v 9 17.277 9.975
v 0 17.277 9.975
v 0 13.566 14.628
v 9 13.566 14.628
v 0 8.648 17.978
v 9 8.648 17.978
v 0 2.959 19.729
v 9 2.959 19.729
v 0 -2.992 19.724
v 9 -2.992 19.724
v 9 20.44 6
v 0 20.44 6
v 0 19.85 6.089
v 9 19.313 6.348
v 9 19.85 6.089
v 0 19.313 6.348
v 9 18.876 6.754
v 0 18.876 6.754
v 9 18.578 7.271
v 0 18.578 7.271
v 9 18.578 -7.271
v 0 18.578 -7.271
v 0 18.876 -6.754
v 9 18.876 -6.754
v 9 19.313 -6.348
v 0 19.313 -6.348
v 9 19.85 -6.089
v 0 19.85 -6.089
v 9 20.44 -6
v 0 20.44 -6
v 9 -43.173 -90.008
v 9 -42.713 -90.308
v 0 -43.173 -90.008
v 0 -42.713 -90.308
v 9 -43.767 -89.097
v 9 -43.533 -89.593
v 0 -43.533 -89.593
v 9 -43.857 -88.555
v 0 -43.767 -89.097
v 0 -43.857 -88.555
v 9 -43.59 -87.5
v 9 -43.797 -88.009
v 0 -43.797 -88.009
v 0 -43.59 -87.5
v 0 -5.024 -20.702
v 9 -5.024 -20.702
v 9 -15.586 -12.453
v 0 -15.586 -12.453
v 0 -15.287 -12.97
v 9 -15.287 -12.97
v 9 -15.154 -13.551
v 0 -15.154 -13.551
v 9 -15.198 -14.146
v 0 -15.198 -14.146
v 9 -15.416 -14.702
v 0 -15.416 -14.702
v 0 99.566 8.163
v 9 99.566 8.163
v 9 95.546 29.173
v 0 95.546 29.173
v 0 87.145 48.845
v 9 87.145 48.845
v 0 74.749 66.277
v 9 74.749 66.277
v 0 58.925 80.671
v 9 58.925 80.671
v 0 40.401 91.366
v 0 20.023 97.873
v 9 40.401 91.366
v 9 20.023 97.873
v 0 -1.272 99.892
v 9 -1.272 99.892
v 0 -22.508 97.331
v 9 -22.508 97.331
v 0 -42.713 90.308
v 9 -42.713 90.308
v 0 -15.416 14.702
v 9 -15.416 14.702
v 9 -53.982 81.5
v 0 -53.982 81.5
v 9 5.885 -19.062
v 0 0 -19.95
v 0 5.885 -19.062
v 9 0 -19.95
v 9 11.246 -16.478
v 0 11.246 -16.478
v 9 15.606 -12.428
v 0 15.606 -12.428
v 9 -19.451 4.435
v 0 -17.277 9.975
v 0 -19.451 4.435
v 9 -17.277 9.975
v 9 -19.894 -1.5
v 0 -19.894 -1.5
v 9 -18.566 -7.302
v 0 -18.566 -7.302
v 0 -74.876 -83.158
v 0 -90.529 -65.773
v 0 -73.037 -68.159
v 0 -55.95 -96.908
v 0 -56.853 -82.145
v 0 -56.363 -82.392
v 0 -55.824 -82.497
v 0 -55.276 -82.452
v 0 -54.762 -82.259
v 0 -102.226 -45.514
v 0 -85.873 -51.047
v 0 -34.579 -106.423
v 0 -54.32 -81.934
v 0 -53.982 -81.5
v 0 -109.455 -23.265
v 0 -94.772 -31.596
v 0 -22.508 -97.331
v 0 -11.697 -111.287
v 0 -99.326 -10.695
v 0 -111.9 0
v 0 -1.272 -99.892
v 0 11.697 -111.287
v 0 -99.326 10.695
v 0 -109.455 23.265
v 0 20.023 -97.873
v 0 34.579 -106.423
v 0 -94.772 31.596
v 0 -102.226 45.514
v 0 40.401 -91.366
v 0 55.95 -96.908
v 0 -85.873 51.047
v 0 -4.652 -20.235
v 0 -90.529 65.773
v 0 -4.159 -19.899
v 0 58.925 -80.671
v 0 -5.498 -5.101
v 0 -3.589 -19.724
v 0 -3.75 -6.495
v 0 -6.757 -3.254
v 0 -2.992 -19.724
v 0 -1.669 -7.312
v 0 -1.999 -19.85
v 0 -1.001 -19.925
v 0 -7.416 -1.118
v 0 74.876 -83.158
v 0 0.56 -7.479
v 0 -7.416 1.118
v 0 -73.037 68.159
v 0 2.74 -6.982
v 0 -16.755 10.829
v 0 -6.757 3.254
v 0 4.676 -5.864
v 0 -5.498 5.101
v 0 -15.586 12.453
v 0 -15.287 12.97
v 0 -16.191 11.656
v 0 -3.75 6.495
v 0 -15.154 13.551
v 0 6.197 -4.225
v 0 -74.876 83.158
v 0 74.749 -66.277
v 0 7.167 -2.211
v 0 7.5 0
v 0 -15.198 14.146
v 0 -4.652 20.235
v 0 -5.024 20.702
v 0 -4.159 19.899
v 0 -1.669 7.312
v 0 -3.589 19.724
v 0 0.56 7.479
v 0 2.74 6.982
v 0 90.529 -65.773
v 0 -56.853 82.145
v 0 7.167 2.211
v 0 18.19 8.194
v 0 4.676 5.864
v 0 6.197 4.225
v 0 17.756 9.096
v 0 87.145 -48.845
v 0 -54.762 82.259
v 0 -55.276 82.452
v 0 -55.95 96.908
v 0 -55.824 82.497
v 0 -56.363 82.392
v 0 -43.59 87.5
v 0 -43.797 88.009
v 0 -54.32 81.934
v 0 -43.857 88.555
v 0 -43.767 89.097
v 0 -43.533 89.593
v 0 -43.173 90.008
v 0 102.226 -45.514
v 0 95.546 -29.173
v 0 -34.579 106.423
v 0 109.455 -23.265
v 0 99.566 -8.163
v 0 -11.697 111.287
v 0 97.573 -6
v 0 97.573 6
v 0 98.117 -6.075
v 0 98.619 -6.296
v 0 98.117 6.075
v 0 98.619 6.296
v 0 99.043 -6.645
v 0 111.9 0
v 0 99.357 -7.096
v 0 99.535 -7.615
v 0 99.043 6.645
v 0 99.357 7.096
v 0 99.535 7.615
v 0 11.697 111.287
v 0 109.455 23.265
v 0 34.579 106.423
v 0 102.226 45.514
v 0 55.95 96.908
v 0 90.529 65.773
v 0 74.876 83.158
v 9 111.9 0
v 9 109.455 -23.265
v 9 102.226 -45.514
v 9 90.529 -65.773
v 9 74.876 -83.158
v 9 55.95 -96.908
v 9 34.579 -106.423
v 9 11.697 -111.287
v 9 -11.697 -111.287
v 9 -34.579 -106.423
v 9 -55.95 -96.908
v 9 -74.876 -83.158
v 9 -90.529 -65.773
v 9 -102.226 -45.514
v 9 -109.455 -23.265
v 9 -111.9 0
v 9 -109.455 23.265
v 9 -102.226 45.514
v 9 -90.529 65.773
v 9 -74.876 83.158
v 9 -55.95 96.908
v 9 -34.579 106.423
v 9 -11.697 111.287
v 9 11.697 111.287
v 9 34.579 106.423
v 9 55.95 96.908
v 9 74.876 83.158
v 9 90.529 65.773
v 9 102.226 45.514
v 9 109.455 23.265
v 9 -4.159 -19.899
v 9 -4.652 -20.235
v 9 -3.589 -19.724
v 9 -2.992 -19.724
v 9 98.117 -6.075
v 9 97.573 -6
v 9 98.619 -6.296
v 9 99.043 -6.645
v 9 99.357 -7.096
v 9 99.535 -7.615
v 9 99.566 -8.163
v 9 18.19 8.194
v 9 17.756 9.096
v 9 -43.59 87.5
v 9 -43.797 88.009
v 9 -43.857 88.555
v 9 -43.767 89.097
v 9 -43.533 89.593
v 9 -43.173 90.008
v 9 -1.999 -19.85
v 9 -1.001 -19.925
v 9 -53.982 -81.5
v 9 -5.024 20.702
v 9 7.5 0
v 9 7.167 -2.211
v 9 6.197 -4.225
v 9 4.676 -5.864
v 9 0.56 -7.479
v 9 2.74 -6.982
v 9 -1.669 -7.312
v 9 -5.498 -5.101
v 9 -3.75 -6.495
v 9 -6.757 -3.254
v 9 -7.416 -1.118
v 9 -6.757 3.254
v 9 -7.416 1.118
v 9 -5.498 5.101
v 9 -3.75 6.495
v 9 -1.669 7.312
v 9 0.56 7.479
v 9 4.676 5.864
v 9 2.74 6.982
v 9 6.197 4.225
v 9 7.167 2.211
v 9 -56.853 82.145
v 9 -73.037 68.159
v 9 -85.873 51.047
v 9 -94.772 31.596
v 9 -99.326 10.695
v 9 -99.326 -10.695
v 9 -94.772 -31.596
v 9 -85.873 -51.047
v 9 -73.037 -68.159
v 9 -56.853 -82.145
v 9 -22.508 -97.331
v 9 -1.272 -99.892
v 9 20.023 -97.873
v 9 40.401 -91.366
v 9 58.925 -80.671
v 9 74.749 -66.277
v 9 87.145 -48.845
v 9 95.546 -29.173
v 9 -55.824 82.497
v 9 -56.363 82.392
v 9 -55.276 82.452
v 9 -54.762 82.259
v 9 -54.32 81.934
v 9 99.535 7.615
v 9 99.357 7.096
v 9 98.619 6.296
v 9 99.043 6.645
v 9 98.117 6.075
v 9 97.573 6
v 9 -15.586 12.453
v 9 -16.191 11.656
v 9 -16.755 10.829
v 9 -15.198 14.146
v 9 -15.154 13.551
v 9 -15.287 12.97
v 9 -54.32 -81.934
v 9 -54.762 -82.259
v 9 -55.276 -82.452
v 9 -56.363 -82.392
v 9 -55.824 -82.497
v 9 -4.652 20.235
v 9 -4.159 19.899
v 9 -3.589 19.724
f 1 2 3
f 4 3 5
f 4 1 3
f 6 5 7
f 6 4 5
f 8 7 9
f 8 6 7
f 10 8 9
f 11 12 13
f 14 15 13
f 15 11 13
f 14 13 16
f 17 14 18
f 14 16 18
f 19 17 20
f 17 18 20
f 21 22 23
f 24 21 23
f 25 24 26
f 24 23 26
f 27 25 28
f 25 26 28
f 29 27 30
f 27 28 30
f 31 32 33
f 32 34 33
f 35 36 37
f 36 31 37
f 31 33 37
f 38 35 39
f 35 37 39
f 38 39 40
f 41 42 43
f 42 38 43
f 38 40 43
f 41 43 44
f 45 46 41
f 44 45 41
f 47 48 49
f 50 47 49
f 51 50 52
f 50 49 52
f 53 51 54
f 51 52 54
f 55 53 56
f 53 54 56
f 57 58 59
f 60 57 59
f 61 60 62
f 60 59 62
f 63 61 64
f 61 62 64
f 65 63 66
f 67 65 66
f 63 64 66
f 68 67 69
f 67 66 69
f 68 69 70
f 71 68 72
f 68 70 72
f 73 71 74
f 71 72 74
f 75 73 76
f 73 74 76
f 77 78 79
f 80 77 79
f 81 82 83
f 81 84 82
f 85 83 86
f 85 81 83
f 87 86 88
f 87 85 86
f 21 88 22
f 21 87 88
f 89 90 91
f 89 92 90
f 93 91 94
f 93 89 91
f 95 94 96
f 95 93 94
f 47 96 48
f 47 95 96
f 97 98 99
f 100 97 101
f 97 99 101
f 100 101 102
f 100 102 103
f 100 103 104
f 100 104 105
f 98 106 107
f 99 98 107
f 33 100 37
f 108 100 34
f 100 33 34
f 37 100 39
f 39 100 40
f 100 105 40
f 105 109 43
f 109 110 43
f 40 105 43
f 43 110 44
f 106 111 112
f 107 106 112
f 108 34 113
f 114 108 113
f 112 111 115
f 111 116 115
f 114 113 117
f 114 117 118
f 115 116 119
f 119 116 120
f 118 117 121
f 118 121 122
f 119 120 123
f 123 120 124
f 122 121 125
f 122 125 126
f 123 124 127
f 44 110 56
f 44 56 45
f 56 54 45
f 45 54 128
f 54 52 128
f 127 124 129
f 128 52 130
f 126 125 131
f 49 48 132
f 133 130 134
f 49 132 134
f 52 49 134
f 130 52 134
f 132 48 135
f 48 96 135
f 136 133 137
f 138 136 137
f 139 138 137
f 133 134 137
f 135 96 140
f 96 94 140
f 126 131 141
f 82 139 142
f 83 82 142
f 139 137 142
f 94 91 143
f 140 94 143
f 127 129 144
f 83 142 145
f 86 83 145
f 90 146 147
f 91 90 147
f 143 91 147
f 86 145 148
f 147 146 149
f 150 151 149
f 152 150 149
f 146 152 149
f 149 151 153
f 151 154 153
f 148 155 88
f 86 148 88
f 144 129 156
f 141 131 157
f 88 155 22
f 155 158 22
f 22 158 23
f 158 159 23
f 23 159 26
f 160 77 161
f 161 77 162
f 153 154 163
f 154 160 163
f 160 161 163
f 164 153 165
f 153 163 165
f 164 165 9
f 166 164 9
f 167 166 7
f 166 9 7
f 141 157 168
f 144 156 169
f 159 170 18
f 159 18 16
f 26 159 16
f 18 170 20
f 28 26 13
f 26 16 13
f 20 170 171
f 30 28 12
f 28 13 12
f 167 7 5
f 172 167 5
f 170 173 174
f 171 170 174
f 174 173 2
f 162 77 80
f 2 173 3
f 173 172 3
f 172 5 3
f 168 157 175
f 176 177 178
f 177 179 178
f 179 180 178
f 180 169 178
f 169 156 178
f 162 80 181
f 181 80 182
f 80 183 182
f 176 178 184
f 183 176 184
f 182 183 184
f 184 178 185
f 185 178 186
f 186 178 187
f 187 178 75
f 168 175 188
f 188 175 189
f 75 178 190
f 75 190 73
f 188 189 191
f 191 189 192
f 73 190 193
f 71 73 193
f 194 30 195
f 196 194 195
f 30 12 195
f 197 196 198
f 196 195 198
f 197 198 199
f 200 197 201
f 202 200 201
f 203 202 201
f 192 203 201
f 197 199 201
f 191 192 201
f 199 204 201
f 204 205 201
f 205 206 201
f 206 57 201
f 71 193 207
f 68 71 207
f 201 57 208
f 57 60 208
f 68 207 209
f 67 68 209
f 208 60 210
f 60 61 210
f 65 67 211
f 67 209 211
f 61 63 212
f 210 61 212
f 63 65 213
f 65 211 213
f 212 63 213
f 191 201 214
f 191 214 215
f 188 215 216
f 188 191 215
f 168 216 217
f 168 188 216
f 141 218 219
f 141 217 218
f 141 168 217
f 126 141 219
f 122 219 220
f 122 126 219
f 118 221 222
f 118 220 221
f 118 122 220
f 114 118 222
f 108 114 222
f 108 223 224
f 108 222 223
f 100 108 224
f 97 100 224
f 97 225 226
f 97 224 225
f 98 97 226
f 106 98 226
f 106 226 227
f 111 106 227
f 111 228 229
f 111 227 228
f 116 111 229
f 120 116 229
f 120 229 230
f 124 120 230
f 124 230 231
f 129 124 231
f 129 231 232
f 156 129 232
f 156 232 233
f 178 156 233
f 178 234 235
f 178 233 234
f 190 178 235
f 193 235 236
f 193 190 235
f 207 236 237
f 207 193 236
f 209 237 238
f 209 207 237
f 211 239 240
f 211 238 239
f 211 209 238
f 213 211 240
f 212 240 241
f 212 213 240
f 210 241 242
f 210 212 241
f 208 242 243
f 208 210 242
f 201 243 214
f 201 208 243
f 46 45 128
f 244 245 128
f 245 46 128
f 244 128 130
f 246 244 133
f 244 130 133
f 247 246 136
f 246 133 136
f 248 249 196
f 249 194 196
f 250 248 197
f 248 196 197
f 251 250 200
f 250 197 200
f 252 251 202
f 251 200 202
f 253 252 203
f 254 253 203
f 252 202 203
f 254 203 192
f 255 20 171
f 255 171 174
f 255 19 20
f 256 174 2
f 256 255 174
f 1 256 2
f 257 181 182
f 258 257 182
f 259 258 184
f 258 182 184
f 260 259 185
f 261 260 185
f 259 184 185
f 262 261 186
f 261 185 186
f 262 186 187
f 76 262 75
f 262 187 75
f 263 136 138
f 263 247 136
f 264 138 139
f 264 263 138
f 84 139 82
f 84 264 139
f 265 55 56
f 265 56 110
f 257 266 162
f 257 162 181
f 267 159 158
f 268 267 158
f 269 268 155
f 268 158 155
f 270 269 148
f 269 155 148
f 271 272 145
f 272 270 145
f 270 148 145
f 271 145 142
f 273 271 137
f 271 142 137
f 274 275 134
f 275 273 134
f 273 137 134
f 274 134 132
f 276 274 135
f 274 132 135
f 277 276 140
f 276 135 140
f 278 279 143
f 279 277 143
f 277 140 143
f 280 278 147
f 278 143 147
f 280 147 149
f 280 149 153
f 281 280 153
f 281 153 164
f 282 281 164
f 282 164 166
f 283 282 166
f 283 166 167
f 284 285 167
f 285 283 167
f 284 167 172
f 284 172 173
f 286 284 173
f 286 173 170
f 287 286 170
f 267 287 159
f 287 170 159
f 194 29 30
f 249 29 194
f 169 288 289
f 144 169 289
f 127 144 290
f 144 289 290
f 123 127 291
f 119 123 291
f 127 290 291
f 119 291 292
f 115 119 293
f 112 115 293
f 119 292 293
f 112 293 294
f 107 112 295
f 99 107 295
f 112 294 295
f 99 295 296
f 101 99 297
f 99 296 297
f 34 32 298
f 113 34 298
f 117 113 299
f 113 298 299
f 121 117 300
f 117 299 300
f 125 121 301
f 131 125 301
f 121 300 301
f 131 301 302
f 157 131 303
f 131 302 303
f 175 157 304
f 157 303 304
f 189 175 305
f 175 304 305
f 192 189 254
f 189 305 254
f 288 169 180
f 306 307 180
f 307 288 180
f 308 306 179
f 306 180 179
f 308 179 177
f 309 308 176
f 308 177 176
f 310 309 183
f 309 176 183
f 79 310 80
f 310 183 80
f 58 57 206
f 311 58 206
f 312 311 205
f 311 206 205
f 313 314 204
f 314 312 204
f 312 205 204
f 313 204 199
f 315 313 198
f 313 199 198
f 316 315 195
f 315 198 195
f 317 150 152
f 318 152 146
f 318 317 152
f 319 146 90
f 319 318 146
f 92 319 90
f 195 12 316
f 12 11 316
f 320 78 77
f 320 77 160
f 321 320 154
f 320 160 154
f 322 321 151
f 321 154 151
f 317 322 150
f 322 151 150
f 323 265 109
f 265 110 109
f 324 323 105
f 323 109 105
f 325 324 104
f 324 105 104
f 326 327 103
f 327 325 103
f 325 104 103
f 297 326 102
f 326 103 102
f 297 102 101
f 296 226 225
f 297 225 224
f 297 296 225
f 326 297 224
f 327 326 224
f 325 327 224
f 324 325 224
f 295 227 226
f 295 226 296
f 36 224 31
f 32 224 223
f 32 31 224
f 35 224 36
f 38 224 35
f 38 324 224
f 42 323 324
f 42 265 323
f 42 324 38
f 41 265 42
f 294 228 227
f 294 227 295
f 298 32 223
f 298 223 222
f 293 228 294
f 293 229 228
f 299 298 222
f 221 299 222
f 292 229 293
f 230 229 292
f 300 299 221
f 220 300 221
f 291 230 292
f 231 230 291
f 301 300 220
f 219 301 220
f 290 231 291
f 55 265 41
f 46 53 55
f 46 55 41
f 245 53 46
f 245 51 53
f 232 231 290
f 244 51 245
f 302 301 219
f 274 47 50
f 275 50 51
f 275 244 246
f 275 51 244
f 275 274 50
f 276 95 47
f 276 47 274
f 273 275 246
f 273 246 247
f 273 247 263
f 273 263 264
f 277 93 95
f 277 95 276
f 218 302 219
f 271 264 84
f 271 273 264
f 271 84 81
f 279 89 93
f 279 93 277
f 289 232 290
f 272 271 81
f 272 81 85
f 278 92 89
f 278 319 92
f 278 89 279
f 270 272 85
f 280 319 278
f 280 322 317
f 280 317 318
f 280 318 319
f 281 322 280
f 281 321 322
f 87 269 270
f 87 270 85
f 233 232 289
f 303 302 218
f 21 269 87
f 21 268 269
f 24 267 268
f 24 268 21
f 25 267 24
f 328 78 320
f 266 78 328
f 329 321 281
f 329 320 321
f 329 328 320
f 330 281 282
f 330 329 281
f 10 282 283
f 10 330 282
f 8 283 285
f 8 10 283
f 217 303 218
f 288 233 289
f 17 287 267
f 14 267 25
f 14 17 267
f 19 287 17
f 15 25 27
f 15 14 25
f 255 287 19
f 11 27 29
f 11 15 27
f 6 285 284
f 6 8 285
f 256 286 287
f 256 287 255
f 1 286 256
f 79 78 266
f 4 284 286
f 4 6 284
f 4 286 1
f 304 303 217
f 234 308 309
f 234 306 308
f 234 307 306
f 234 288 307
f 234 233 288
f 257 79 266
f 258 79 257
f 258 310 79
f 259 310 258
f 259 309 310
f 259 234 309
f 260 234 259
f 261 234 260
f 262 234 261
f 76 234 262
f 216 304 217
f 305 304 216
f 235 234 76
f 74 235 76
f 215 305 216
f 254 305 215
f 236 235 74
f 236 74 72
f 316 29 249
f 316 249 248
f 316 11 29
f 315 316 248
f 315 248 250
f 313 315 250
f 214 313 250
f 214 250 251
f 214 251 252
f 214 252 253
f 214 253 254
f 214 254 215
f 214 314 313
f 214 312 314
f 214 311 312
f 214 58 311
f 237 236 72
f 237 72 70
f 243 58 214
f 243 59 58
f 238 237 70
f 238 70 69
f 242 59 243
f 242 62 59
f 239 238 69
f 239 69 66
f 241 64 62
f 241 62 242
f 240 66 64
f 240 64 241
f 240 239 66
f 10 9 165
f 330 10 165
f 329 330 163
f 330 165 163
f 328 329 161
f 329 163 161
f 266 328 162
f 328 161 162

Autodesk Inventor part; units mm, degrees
ref_plane "YZ Plane" through (0, 0, 0) normal (1, 0, 0) x (0, 1, 0)
ref_plane "XZ Plane" through (0, 0, 0) normal (0, 1, 0) x (-1, 0, 0)
ref_plane "XY Plane" through (0, 0, 0) normal (0, 0, 1) x (1, 0, 0)
sketch "Sketch1" plane through (0, 0, 0) normal (1, 0, 0) x (0, 1, 0)
  circle A0 centre (0, 0) radius 7.5
  circle A1 centre (0, 0) radius 111.9
  dimension "D_eje" = 15
  dimension "d1" = 223.8
extrude "Extrusion1" add sketch "Sketch1" along normal blind 9
sketch "Sketch2" plane through (9, 0, 0) normal (1, 0, 0) x (0, 0, -1)
  line L0 (6, 19.0264) -> (6, 99.7197)
  line L1 (0, -188.1875) -> (0, 173.8632) construction
  arc A0 (0, 19.95) -> (-13.4773, 14.7093) centre (0, 0) ccw construction
  circle A1 centre (0, 0) radius 7.5 construction
  arc A2 (0, 99.9) -> (86.5159, -49.95) centre (0, 0) ccw construction
  line L2 (181.1282, 0) -> (-189.3983, 0) construction
  arc A3 (6, 19.0264) -> (0, 19.95) centre (0, 0) ccw construction
  arc A4 (-19.95, 0) -> (0, -19.95) centre (0, 0) ccw construction
  arc A5 (0, -19.95) -> (17.2772, -9.975) centre (0, 0) ccw construction
  arc A6 (19.95, 0) -> (6, 19.0264) centre (0, 0) ccw
  line L3 (0, 0) -> (86.5159, -49.95) construction
  line L4 (19.4773, -4.317) -> (89.3598, -44.6637)
  arc A7 (-13.4773, 14.7093) -> (-19.95, 0) centre (0, 0) ccw construction
  arc A8 (19.4773, -4.317) -> (19.95, 0) centre (0, 0) ccw
  arc A9 (17.2772, -9.975) -> (19.4773, -4.317) centre (0, 0) ccw construction
  arc A10 (6, 99.7197) -> (0, 99.9) centre (0, 0) ccw construction
  arc A11 (86.5159, -49.95) -> (89.3598, -44.6637) centre (0, 0) ccw construction
  arc A12 (89.3598, -44.6637) -> (6, 99.7197) centre (0, 0) ccw
  line L5 (-19.4773, -4.317) -> (-89.3598, -44.6637)
  arc A13 (-6, 99.7197) -> (-89.3598, -44.6637) centre (0, 0) ccw
  line L6 (-6, 19.0264) -> (-6, 99.7197)
  arc A14 (-9.975, 17.2772) -> (-19.4773, -4.317) centre (0, 0) ccw
  line L7 (13.4773, -14.7093) -> (83.3598, -55.056)
  arc A15 (-83.3598, -55.056) -> (83.3598, -55.056) centre (0, 0) ccw
  line L8 (-13.4773, -14.7093) -> (-83.3598, -55.056)
  arc A16 (-9.975, -17.2772) -> (13.4773, -14.7093) centre (0, 0) ccw
  point P0 (-6, -19.0264)
  point P1 (19.4773, 4.317)
  dimension "d4" = 6
  dimension "d7" = 39.9
  dimension "d8" = 199.8
  dimension "d10" = 120
  dimension "d11" = 6
  dimension "d14" = 360
extrude "Extrusion2" cut sketch "Sketch2" against normal blind 9
pattern_circular "Circular Pattern1" count 3 over 360 about axis through (-10, 0, 0) along (1, 0, 0) of "Extrusion2"
fillet "Fillet1" radius 2 12 edges at (4.5, -14.7093, -13.4773) (4.5, -14.7093, 13.4773) (4.5, -55.056, 83.3598) (4.5, -55.056, -83.3598) (4.5, -44.6637, -89.3598) (4.5, 99.7197, -6) (4.5, -4.317, -19.4773) (4.5, 19.0264, -6) (4.5, 19.0264, 6) (4.5, -4.317, 19.4773) (4.5, 99.7197, 6) (4.5, -44.6637, 89.3598)
properties part number "Rueda_triciclo" material "Aluminum 6061"
